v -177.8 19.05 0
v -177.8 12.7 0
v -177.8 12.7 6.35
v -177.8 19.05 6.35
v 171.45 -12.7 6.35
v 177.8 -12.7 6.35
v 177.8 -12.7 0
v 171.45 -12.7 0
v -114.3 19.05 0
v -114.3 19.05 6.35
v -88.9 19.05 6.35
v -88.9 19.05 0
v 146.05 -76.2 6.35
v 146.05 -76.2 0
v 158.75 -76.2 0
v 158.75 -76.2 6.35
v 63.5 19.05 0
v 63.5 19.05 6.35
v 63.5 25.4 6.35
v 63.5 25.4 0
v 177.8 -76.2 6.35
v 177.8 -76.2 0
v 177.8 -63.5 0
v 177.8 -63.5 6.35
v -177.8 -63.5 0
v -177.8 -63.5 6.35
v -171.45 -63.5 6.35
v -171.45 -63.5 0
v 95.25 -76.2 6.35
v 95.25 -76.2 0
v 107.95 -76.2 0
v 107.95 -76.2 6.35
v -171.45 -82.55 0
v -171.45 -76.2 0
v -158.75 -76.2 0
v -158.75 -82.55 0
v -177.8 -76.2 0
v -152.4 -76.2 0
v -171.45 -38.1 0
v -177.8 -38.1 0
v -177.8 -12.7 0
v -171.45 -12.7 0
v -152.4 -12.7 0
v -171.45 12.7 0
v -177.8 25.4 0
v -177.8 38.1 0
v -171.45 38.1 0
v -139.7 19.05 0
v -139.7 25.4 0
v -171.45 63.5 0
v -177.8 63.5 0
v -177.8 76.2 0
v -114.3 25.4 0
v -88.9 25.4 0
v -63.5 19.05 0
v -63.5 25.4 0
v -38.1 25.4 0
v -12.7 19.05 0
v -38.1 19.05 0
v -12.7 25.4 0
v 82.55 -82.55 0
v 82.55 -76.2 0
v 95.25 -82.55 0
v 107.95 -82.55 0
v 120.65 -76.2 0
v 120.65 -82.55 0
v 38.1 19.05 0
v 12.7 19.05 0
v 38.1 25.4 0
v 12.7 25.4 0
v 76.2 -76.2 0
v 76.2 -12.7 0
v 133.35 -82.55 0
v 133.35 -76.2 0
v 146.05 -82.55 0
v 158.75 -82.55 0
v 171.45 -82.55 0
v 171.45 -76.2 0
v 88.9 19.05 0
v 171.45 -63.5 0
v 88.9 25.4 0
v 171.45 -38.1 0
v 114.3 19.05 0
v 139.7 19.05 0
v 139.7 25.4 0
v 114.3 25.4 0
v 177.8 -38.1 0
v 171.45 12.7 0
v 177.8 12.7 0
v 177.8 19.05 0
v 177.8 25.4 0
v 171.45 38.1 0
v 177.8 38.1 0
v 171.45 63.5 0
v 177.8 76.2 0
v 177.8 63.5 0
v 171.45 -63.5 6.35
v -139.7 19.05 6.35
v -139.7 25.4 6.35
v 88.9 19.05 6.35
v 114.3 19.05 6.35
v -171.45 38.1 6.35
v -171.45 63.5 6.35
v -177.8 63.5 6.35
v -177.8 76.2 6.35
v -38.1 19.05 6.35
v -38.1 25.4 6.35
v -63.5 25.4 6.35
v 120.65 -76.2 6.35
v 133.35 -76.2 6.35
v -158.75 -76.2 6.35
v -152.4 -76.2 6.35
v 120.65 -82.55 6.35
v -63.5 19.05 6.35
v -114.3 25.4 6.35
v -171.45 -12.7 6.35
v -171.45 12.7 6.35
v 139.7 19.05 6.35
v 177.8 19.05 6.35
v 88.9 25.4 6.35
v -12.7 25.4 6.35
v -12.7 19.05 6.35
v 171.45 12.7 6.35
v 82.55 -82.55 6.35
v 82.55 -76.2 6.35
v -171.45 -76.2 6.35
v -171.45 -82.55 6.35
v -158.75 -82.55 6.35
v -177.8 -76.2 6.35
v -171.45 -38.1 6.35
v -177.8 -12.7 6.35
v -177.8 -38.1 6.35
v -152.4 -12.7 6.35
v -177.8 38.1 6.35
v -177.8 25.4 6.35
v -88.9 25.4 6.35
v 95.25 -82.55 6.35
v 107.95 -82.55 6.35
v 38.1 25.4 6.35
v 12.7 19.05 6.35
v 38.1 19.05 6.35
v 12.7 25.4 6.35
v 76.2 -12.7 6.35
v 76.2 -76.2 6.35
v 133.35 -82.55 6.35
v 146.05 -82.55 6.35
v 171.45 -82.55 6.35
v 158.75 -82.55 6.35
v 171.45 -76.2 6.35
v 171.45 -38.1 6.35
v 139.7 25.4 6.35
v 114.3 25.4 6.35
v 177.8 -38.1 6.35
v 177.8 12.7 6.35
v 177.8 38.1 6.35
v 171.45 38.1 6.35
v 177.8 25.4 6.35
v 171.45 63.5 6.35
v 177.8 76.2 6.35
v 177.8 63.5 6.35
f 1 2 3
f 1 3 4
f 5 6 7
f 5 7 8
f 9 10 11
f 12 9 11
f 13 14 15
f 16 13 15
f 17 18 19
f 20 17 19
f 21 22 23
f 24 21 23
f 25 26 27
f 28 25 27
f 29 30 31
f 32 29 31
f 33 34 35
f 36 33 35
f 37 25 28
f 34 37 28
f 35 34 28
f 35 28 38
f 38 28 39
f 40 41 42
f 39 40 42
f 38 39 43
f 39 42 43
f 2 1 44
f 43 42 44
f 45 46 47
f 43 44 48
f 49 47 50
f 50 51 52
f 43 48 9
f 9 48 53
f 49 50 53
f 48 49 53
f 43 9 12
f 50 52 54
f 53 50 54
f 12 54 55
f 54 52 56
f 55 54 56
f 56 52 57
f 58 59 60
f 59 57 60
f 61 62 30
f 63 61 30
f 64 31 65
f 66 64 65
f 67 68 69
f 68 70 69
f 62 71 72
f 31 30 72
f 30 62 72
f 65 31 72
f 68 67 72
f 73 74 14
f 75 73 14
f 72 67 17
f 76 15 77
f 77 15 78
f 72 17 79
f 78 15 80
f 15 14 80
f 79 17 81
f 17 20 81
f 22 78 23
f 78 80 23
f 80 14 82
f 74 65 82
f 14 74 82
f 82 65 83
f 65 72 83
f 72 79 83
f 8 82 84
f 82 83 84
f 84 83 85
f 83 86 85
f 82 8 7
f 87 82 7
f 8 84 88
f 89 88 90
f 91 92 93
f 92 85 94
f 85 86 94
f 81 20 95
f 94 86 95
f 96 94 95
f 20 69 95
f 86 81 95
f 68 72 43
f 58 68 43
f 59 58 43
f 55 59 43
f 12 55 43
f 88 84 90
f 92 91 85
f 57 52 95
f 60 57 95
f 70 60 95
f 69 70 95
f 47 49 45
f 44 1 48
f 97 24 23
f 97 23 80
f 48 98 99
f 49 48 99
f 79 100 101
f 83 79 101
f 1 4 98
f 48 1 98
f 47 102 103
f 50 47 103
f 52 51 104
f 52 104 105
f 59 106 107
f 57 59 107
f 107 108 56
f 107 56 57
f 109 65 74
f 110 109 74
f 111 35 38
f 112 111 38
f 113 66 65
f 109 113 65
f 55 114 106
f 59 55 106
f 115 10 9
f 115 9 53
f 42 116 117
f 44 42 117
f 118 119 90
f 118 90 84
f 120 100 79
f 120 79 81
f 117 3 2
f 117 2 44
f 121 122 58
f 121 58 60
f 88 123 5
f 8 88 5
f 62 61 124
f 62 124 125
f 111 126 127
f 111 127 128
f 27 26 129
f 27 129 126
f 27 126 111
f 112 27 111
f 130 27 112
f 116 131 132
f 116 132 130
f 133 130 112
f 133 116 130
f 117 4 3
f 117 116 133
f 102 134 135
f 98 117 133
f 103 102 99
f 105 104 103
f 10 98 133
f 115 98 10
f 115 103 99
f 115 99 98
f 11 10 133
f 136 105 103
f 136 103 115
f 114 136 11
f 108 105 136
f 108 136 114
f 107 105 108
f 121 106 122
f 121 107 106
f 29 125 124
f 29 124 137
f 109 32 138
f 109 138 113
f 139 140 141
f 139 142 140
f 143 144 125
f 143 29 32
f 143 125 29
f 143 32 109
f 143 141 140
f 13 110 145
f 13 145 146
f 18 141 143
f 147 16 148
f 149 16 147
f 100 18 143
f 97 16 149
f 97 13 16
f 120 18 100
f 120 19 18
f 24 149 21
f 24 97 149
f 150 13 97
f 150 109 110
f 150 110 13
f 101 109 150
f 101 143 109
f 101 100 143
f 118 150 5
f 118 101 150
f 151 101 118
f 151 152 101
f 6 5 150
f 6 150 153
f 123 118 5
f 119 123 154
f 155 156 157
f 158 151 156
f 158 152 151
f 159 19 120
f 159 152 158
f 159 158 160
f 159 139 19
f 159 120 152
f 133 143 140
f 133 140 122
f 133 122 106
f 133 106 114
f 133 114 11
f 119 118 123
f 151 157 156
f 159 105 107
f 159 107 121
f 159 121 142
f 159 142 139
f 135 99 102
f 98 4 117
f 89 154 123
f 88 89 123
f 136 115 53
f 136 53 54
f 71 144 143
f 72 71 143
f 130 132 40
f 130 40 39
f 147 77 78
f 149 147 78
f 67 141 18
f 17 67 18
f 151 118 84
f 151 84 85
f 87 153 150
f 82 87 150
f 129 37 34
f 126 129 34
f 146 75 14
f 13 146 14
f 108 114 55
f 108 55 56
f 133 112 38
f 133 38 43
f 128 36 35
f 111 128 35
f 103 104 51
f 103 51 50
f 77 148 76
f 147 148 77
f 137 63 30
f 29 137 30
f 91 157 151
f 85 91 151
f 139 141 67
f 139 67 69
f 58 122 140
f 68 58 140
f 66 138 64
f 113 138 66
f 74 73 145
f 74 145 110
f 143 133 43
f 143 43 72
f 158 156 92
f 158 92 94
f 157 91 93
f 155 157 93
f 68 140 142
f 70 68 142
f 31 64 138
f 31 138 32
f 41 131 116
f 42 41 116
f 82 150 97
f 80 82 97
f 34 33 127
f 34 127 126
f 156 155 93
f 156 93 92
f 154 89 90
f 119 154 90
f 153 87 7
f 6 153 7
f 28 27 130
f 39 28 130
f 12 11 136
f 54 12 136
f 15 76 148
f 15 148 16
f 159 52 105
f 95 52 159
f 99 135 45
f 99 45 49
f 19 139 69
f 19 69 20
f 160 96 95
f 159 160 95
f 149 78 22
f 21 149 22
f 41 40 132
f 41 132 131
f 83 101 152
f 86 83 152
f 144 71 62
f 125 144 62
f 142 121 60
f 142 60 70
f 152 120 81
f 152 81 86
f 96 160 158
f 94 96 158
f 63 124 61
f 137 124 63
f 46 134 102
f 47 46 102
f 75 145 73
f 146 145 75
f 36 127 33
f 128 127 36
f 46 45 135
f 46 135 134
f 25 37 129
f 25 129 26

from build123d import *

# Parameters (mm, degrees)
ESQUISSE1_W                = 355.6
ESQUISSE1_H                = 152.4
BOSS_EXTRU_1_DEPTH         = 6.35
ESQUISSE3_W                = 6.35
ESQUISSE3_H                = 25.4
ENL_V_MAT_EXTRU_2_DEPTH    = 6.35
R_P_TITION_LIN_AIRE2_COUNT = 3
R_P_TITION_LIN_AIRE2_PITCH = 50.8
SYM_TRIE1_COPY_1_SKETCH_W  = 6.35
SYM_TRIE1_COPY_1_SKETCH_H  = 25.4
SYM_TRIE1_COPY_1_DEPTH     = 6.35
SYM_TRIE1_COPY_2_SKETCH_W  = 6.35
SYM_TRIE1_COPY_2_SKETCH_H  = 25.4
SYM_TRIE1_COPY_2_DEPTH     = 6.35
CUT_EXTRUDE1_REACH         = 195.545
SKETCH1_W                  = 228.6
SKETCH1_H                  = 63.5
ESQUISSE5_W                = 38.1
ESQUISSE5_H                = 6.35
ENL_V_MAT_EXTRU_4_DEPTH    = 6.35
ESQUISSE6_W                = 25.4
ESQUISSE6_H                = 6.35
ENL_V_MAT_EXTRU_5_DEPTH    = 6.35
R_P_TITION_LIN_AIRE3_COUNT = 5
R_P_TITION_LIN_AIRE3_PITCH = 50.8
ESQUISSE8_W                = 12.7
ESQUISSE8_H                = 6.35
BOSS_EXTRU_2_DEPTH         = 6.35


with BuildPart() as part:
    # Esquisse1 → Boss.-Extru.1 (new body)
    with BuildSketch(Plane.XY):
        Rectangle(ESQUISSE1_W, ESQUISSE1_H)
    extrude(amount=BOSS_EXTRU_1_DEPTH)

    # Esquisse3 → Enlèv. mat.-Extru.2 (cut)
    with BuildSketch(Plane.XY.offset(6.35)):
        with Locations((-174.625, 50.8)):
            Rectangle(ESQUISSE3_W, ESQUISSE3_H)
    enl_v_mat_extru_2 = extrude(amount=-ENL_V_MAT_EXTRU_2_DEPTH, mode=Mode.SUBTRACT)

    # Répétition linéaire2: Enlèv. mat.-Extru.2 ×3
    with Locations(*[(0, -i * R_P_TITION_LIN_AIRE2_PITCH, 0) for i in range(1, R_P_TITION_LIN_AIRE2_COUNT)]):
        add(enl_v_mat_extru_2, mode=Mode.SUBTRACT)

    # Symétrie1: Enlèv. mat.-Extru.2 across plane
    add(enl_v_mat_extru_2.mirror(Plane(origin=(0, 0, 0), x_dir=(0, 0, 1), z_dir=(1, 0, 0))), mode=Mode.SUBTRACT)

    # Symétrie1 copy 1 sketch → Symétrie1 copy 1 (cut)
    with BuildSketch(Plane(origin=(0, -50.8, 6.35), x_dir=(-1, 0, 0), z_dir=(0, 0, 1))):
        with Locations((-174.625, -50.8)):
            Rectangle(SYM_TRIE1_COPY_1_SKETCH_W, SYM_TRIE1_COPY_1_SKETCH_H)
    extrude(amount=-SYM_TRIE1_COPY_1_DEPTH, mode=Mode.SUBTRACT)

    # Symétrie1 copy 2 sketch → Symétrie1 copy 2 (cut)
    with BuildSketch(Plane(origin=(0, -101.6, 6.35), x_dir=(-1, 0, 0), z_dir=(0, 0, 1))):
        with Locations((-174.625, -50.8)):
            Rectangle(SYM_TRIE1_COPY_2_SKETCH_W, SYM_TRIE1_COPY_2_SKETCH_H)
    extrude(amount=-SYM_TRIE1_COPY_2_DEPTH, mode=Mode.SUBTRACT)

    # Sketch1 → Cut-Extrude1 (cut, up to next)
    with BuildSketch(Plane.XY.offset(6.35), mode=Mode.PRIVATE) as cut_extrude1_sk1:
        with Locations((-38.1, -44.45)):
            Rectangle(SKETCH1_W, SKETCH1_H)
    cut_extrude1_tool1 = extrude(cut_extrude1_sk1.sketch, amount=-CUT_EXTRUDE1_REACH, mode=Mode.PRIVATE) & part.part
    add(cut_extrude1_tool1.solids().sort_by_distance((-38.1, -44.45, 6.35))[0], mode=Mode.SUBTRACT)

    # Esquisse5 → Enlèv. mat.-Extru.4 (cut)
    with BuildSketch(Plane.XY.offset(6.35)):
        with Locations((-158.75, 22.225)):
            Rectangle(ESQUISSE5_W, ESQUISSE5_H)
    enl_v_mat_extru_4 = extrude(amount=-ENL_V_MAT_EXTRU_4_DEPTH, mode=Mode.SUBTRACT)

    # Symétrie2: Enlèv. mat.-Extru.4 across plane
    add(enl_v_mat_extru_4.mirror(Plane(origin=(0, 0, 0), x_dir=(0, 0, 1), z_dir=(1, 0, 0))), mode=Mode.SUBTRACT)

    # Esquisse6 → Enlèv. mat.-Extru.5 (cut)
    with BuildSketch(Plane.XY.offset(6.35)):
        with Locations((-101.6, 22.225)):
            Rectangle(ESQUISSE6_W, ESQUISSE6_H)
    enl_v_mat_extru_5 = extrude(amount=-ENL_V_MAT_EXTRU_5_DEPTH, mode=Mode.SUBTRACT)

    # Répétition linéaire3: Enlèv. mat.-Extru.5 ×5
    with Locations(*[(i * R_P_TITION_LIN_AIRE3_PITCH, 0, 0) for i in range(1, R_P_TITION_LIN_AIRE3_COUNT)]):
        add(enl_v_mat_extru_5, mode=Mode.SUBTRACT)

    # Esquisse8 → Boss.-Extru.2 (add)
    with BuildSketch(Plane.XY.offset(6.35)):
        with Locations((-165.1, -79.375)):
            Rectangle(ESQUISSE8_W, ESQUISSE8_H)
        with Locations((88.9, -79.375)):
            Rectangle(ESQUISSE8_W, ESQUISSE8_H)
        with Locations((114.3, -79.375)):
            Rectangle(ESQUISSE8_W, ESQUISSE8_H)
        with Locations((139.7, -79.375)):
            Rectangle(ESQUISSE8_W, ESQUISSE8_H)
        with Locations((165.1, -79.375)):
            Rectangle(ESQUISSE8_W, ESQUISSE8_H)
    extrude(amount=-BOSS_EXTRU_2_DEPTH)


solid = part.part
